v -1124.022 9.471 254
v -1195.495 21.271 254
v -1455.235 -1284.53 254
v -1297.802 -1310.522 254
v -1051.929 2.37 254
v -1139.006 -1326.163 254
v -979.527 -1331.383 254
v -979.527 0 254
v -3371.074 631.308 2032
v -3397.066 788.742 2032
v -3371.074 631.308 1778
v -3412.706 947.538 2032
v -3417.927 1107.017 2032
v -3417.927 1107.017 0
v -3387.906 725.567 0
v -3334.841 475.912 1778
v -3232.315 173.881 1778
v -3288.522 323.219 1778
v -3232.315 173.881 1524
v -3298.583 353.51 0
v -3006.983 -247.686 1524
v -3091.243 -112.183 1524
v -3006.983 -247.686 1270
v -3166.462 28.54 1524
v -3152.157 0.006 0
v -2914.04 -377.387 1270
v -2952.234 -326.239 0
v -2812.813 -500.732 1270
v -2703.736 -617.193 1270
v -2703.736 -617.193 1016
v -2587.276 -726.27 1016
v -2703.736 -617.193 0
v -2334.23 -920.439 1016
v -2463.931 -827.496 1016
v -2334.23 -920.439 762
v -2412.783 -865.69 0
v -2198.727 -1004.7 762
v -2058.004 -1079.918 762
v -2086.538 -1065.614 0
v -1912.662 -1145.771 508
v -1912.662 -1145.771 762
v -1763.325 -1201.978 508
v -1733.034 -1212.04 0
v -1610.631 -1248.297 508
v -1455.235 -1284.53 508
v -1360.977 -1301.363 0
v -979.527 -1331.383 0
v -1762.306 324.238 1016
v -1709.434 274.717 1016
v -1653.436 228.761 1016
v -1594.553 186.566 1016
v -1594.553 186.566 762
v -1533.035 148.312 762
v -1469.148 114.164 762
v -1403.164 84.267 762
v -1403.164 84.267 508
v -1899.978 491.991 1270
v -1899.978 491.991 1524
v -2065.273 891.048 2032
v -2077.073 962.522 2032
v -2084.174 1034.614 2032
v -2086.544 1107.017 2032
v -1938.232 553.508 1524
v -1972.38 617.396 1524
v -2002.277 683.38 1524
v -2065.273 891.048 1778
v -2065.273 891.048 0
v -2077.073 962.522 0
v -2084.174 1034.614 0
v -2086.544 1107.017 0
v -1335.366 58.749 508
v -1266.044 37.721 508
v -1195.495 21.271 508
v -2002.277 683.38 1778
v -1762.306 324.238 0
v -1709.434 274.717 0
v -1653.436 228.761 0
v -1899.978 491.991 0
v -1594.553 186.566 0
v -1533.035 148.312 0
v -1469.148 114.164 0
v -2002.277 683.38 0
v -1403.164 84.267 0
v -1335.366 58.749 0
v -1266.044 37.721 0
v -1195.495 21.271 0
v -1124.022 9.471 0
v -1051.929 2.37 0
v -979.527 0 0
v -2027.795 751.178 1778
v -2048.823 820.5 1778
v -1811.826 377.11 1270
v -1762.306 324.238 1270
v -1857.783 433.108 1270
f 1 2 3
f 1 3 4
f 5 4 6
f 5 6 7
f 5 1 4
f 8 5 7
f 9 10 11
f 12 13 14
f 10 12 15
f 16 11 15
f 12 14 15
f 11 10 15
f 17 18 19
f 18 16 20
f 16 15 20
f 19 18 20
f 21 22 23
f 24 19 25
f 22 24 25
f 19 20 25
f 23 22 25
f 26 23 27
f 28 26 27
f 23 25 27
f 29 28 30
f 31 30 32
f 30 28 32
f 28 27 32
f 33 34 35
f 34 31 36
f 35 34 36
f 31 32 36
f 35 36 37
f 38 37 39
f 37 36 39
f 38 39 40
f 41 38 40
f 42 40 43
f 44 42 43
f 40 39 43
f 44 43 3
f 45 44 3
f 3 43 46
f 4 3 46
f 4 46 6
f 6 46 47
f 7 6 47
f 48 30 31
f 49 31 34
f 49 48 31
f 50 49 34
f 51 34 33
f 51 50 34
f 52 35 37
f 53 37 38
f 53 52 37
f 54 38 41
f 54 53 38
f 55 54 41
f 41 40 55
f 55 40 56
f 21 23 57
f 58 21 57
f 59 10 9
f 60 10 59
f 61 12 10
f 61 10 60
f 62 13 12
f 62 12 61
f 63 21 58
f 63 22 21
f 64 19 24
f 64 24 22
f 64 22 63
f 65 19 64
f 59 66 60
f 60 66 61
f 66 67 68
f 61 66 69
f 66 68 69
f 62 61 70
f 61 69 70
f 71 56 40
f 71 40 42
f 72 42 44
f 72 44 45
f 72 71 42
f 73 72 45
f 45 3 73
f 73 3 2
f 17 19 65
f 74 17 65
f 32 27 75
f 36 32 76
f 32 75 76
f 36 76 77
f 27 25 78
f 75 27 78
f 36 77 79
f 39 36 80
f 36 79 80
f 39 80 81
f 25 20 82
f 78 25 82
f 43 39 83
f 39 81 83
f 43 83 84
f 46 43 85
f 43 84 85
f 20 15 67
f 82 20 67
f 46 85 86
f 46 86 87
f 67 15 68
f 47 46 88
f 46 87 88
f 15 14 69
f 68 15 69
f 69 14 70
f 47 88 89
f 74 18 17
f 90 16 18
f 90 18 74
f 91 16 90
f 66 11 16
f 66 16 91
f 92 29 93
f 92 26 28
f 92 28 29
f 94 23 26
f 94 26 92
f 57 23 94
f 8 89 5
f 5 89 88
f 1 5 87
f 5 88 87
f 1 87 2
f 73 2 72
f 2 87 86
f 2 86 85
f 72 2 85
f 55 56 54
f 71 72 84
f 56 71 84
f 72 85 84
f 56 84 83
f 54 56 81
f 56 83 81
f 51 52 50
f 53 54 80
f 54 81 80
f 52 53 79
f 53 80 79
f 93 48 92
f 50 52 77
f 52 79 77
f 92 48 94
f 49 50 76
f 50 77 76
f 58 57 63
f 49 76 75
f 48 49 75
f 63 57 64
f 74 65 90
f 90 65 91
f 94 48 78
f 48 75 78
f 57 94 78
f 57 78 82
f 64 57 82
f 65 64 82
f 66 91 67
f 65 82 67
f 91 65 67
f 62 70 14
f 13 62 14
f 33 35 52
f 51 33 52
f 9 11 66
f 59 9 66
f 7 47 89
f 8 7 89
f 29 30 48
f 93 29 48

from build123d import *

# Parameters (mm, degrees)
F10_DEPTH = 254
F11_DEPTH = 508
F12_DEPTH = 762
F13_DEPTH = 1016
F14_DEPTH = 1270
F15_DEPTH = 1524
F16_DEPTH = 1778
F17_DEPTH = 2032


# Not quite as in the source:
# - a variable given as a bare number and used for a length is read in inches; the dataset says mm whatever the document's units were


with BuildPart() as f10:
    # F2 (on Top) → F10 (new body)
    with BuildSketch(Plane.XY):
        with BuildLine():
            Line((-979.52713178, -1331.3833333333), (-979.52713178, 0))
            ThreePointArc((-979.52713178, 0), (-1088.0337397438, 5.3305878284), (-1195.4953697572, 21.271014839))
            Line((-1195.4953697572, 21.271014839), (-1455.2353729841, -1284.5301610686))
            ThreePointArc((-1455.2353729841, -1284.5301610686), (-1218.5321267596, -1319.6417708508), (-979.52713178, -1331.3833333333))
        make_face()
    extrude(amount=F10_DEPTH)

    # F3 (on Top) → F11 (join)
    with BuildSketch(Plane.XY):
        with BuildLine():
            Line((-1455.2353729841, -1284.5301610686), (-1195.4953697572, 21.271014839))
            ThreePointArc((-1195.4953697572, 21.271014839), (-1300.8771075786, 47.6677660055), (-1403.1640694653, 84.2666261845))
            Line((-1403.1640694653, 84.2666261845), (-1912.662413259, -1145.7711854089))
            ThreePointArc((-1912.662413259, -1145.7711854089), (-1687.3572887973, -1226.3866479828), (-1455.2353729841, -1284.5301610686))
        make_face()
    extrude(amount=F11_DEPTH)

    # F4 (on Top) → F12 (join)
    with BuildSketch(Plane.XY):
        with BuildLine():
            Line((-1912.662413259, -1145.7711854089), (-1403.1640694653, 84.2666261845))
            ThreePointArc((-1403.1640694653, 84.2666261845), (-1501.3711760586, 130.7151283453), (-1594.5526392366, 186.5659480209))
            Line((-1594.5526392366, 186.5659480209), (-2334.229587975, -920.4388359719))
            ThreePointArc((-2334.229587975, -920.4388359719), (-2128.9809348565, -1043.4601443204), (-1912.662413259, -1145.7711854089))
        make_face()
    extrude(amount=F12_DEPTH)

    # F5 (on Top) → F13 (join)
    with BuildSketch(Plane.XY):
        with BuildLine():
            Line((-2334.229587975, -920.4388359719), (-1594.5526392366, 186.5659480209))
            ThreePointArc((-1594.5526392366, 186.5659480209), (-1681.8110705705, 251.2812112866), (-1762.3061236665, 324.2376747801))
            Line((-1762.3061236665, 324.2376747801), (-2703.7363070253, -617.1925085786))
            ThreePointArc((-2703.7363070253, -617.1925085786), (-2526.4317158846, -777.892022813), (-2334.229587975, -920.4388359719))
        make_face()
    extrude(amount=F13_DEPTH)

    # F6 (on Top) → F14 (join)
    with BuildSketch(Plane.XY):
        with BuildLine():
            Line((-2703.7363070253, -617.1925085786), (-1762.3061236665, 324.2376747801))
            ThreePointArc((-1762.3061236665, 324.2376747801), (-1835.2625871601, 404.7327278761), (-1899.9778504258, 491.9911592101))
            Line((-1899.9778504258, 491.9911592101), (-3006.9826344185, -247.6857895283))
            ThreePointArc((-3006.9826344185, -247.6857895283), (-2864.4358212597, -439.887917438), (-2703.7363070253, -617.1925085786))
        make_face()
    extrude(amount=F14_DEPTH)

    # F7 (on Top) → F15 (join)
    with BuildSketch(Plane.XY):
        with BuildLine():
            Line((-3006.9826344185, -247.6857895283), (-1899.9778504258, 491.9911592101))
            ThreePointArc((-1899.9778504258, 491.9911592101), (-1955.8286701014, 585.172622388), (-2002.2771722622, 683.3797289813))
            Line((-2002.2771722622, 683.3797289813), (-3232.3149838555, 173.8813851876))
            ThreePointArc((-3232.3149838555, 173.8813851876), (-3130.003942767, -42.4371364098), (-3006.9826344185, -247.6857895283))
        make_face()
    extrude(amount=F15_DEPTH)

    # F8 (on Top) → F16 (join)
    with BuildSketch(Plane.XY):
        with BuildLine():
            Line((-3232.3149838555, 173.8813851876), (-2002.2771722622, 683.3797289813))
            ThreePointArc((-2002.2771722622, 683.3797289813), (-2038.8760324411, 785.666690868), (-2065.2727836077, 891.0484286894))
            Line((-2065.2727836077, 891.0484286894), (-3371.0739595152, 631.3084254625))
            ThreePointArc((-3371.0739595152, 631.3084254625), (-3312.9304464294, 399.1865096494), (-3232.3149838555, 173.8813851876))
        make_face()
    extrude(amount=F16_DEPTH)

    # F9 (on Top) → F17 (join)
    with BuildSketch(Plane.XY):
        with BuildLine():
            Line((-3371.0739595152, 631.3084254625), (-2065.2727836077, 891.0484286894))
            ThreePointArc((-2065.2727836077, 891.0484286894), (-2081.2132106182, 998.5100587028), (-2086.5437984467, 1107.0166666667))
            Line((-2086.5437984467, 1107.0166666667), (-3417.92713178, 1107.0166666667))
            ThreePointArc((-3417.92713178, 1107.0166666667), (-3406.1855692975, 868.0116716871), (-3371.0739595152, 631.3084254625))
        make_face()
    extrude(amount=F17_DEPTH)


solid = f10.part
